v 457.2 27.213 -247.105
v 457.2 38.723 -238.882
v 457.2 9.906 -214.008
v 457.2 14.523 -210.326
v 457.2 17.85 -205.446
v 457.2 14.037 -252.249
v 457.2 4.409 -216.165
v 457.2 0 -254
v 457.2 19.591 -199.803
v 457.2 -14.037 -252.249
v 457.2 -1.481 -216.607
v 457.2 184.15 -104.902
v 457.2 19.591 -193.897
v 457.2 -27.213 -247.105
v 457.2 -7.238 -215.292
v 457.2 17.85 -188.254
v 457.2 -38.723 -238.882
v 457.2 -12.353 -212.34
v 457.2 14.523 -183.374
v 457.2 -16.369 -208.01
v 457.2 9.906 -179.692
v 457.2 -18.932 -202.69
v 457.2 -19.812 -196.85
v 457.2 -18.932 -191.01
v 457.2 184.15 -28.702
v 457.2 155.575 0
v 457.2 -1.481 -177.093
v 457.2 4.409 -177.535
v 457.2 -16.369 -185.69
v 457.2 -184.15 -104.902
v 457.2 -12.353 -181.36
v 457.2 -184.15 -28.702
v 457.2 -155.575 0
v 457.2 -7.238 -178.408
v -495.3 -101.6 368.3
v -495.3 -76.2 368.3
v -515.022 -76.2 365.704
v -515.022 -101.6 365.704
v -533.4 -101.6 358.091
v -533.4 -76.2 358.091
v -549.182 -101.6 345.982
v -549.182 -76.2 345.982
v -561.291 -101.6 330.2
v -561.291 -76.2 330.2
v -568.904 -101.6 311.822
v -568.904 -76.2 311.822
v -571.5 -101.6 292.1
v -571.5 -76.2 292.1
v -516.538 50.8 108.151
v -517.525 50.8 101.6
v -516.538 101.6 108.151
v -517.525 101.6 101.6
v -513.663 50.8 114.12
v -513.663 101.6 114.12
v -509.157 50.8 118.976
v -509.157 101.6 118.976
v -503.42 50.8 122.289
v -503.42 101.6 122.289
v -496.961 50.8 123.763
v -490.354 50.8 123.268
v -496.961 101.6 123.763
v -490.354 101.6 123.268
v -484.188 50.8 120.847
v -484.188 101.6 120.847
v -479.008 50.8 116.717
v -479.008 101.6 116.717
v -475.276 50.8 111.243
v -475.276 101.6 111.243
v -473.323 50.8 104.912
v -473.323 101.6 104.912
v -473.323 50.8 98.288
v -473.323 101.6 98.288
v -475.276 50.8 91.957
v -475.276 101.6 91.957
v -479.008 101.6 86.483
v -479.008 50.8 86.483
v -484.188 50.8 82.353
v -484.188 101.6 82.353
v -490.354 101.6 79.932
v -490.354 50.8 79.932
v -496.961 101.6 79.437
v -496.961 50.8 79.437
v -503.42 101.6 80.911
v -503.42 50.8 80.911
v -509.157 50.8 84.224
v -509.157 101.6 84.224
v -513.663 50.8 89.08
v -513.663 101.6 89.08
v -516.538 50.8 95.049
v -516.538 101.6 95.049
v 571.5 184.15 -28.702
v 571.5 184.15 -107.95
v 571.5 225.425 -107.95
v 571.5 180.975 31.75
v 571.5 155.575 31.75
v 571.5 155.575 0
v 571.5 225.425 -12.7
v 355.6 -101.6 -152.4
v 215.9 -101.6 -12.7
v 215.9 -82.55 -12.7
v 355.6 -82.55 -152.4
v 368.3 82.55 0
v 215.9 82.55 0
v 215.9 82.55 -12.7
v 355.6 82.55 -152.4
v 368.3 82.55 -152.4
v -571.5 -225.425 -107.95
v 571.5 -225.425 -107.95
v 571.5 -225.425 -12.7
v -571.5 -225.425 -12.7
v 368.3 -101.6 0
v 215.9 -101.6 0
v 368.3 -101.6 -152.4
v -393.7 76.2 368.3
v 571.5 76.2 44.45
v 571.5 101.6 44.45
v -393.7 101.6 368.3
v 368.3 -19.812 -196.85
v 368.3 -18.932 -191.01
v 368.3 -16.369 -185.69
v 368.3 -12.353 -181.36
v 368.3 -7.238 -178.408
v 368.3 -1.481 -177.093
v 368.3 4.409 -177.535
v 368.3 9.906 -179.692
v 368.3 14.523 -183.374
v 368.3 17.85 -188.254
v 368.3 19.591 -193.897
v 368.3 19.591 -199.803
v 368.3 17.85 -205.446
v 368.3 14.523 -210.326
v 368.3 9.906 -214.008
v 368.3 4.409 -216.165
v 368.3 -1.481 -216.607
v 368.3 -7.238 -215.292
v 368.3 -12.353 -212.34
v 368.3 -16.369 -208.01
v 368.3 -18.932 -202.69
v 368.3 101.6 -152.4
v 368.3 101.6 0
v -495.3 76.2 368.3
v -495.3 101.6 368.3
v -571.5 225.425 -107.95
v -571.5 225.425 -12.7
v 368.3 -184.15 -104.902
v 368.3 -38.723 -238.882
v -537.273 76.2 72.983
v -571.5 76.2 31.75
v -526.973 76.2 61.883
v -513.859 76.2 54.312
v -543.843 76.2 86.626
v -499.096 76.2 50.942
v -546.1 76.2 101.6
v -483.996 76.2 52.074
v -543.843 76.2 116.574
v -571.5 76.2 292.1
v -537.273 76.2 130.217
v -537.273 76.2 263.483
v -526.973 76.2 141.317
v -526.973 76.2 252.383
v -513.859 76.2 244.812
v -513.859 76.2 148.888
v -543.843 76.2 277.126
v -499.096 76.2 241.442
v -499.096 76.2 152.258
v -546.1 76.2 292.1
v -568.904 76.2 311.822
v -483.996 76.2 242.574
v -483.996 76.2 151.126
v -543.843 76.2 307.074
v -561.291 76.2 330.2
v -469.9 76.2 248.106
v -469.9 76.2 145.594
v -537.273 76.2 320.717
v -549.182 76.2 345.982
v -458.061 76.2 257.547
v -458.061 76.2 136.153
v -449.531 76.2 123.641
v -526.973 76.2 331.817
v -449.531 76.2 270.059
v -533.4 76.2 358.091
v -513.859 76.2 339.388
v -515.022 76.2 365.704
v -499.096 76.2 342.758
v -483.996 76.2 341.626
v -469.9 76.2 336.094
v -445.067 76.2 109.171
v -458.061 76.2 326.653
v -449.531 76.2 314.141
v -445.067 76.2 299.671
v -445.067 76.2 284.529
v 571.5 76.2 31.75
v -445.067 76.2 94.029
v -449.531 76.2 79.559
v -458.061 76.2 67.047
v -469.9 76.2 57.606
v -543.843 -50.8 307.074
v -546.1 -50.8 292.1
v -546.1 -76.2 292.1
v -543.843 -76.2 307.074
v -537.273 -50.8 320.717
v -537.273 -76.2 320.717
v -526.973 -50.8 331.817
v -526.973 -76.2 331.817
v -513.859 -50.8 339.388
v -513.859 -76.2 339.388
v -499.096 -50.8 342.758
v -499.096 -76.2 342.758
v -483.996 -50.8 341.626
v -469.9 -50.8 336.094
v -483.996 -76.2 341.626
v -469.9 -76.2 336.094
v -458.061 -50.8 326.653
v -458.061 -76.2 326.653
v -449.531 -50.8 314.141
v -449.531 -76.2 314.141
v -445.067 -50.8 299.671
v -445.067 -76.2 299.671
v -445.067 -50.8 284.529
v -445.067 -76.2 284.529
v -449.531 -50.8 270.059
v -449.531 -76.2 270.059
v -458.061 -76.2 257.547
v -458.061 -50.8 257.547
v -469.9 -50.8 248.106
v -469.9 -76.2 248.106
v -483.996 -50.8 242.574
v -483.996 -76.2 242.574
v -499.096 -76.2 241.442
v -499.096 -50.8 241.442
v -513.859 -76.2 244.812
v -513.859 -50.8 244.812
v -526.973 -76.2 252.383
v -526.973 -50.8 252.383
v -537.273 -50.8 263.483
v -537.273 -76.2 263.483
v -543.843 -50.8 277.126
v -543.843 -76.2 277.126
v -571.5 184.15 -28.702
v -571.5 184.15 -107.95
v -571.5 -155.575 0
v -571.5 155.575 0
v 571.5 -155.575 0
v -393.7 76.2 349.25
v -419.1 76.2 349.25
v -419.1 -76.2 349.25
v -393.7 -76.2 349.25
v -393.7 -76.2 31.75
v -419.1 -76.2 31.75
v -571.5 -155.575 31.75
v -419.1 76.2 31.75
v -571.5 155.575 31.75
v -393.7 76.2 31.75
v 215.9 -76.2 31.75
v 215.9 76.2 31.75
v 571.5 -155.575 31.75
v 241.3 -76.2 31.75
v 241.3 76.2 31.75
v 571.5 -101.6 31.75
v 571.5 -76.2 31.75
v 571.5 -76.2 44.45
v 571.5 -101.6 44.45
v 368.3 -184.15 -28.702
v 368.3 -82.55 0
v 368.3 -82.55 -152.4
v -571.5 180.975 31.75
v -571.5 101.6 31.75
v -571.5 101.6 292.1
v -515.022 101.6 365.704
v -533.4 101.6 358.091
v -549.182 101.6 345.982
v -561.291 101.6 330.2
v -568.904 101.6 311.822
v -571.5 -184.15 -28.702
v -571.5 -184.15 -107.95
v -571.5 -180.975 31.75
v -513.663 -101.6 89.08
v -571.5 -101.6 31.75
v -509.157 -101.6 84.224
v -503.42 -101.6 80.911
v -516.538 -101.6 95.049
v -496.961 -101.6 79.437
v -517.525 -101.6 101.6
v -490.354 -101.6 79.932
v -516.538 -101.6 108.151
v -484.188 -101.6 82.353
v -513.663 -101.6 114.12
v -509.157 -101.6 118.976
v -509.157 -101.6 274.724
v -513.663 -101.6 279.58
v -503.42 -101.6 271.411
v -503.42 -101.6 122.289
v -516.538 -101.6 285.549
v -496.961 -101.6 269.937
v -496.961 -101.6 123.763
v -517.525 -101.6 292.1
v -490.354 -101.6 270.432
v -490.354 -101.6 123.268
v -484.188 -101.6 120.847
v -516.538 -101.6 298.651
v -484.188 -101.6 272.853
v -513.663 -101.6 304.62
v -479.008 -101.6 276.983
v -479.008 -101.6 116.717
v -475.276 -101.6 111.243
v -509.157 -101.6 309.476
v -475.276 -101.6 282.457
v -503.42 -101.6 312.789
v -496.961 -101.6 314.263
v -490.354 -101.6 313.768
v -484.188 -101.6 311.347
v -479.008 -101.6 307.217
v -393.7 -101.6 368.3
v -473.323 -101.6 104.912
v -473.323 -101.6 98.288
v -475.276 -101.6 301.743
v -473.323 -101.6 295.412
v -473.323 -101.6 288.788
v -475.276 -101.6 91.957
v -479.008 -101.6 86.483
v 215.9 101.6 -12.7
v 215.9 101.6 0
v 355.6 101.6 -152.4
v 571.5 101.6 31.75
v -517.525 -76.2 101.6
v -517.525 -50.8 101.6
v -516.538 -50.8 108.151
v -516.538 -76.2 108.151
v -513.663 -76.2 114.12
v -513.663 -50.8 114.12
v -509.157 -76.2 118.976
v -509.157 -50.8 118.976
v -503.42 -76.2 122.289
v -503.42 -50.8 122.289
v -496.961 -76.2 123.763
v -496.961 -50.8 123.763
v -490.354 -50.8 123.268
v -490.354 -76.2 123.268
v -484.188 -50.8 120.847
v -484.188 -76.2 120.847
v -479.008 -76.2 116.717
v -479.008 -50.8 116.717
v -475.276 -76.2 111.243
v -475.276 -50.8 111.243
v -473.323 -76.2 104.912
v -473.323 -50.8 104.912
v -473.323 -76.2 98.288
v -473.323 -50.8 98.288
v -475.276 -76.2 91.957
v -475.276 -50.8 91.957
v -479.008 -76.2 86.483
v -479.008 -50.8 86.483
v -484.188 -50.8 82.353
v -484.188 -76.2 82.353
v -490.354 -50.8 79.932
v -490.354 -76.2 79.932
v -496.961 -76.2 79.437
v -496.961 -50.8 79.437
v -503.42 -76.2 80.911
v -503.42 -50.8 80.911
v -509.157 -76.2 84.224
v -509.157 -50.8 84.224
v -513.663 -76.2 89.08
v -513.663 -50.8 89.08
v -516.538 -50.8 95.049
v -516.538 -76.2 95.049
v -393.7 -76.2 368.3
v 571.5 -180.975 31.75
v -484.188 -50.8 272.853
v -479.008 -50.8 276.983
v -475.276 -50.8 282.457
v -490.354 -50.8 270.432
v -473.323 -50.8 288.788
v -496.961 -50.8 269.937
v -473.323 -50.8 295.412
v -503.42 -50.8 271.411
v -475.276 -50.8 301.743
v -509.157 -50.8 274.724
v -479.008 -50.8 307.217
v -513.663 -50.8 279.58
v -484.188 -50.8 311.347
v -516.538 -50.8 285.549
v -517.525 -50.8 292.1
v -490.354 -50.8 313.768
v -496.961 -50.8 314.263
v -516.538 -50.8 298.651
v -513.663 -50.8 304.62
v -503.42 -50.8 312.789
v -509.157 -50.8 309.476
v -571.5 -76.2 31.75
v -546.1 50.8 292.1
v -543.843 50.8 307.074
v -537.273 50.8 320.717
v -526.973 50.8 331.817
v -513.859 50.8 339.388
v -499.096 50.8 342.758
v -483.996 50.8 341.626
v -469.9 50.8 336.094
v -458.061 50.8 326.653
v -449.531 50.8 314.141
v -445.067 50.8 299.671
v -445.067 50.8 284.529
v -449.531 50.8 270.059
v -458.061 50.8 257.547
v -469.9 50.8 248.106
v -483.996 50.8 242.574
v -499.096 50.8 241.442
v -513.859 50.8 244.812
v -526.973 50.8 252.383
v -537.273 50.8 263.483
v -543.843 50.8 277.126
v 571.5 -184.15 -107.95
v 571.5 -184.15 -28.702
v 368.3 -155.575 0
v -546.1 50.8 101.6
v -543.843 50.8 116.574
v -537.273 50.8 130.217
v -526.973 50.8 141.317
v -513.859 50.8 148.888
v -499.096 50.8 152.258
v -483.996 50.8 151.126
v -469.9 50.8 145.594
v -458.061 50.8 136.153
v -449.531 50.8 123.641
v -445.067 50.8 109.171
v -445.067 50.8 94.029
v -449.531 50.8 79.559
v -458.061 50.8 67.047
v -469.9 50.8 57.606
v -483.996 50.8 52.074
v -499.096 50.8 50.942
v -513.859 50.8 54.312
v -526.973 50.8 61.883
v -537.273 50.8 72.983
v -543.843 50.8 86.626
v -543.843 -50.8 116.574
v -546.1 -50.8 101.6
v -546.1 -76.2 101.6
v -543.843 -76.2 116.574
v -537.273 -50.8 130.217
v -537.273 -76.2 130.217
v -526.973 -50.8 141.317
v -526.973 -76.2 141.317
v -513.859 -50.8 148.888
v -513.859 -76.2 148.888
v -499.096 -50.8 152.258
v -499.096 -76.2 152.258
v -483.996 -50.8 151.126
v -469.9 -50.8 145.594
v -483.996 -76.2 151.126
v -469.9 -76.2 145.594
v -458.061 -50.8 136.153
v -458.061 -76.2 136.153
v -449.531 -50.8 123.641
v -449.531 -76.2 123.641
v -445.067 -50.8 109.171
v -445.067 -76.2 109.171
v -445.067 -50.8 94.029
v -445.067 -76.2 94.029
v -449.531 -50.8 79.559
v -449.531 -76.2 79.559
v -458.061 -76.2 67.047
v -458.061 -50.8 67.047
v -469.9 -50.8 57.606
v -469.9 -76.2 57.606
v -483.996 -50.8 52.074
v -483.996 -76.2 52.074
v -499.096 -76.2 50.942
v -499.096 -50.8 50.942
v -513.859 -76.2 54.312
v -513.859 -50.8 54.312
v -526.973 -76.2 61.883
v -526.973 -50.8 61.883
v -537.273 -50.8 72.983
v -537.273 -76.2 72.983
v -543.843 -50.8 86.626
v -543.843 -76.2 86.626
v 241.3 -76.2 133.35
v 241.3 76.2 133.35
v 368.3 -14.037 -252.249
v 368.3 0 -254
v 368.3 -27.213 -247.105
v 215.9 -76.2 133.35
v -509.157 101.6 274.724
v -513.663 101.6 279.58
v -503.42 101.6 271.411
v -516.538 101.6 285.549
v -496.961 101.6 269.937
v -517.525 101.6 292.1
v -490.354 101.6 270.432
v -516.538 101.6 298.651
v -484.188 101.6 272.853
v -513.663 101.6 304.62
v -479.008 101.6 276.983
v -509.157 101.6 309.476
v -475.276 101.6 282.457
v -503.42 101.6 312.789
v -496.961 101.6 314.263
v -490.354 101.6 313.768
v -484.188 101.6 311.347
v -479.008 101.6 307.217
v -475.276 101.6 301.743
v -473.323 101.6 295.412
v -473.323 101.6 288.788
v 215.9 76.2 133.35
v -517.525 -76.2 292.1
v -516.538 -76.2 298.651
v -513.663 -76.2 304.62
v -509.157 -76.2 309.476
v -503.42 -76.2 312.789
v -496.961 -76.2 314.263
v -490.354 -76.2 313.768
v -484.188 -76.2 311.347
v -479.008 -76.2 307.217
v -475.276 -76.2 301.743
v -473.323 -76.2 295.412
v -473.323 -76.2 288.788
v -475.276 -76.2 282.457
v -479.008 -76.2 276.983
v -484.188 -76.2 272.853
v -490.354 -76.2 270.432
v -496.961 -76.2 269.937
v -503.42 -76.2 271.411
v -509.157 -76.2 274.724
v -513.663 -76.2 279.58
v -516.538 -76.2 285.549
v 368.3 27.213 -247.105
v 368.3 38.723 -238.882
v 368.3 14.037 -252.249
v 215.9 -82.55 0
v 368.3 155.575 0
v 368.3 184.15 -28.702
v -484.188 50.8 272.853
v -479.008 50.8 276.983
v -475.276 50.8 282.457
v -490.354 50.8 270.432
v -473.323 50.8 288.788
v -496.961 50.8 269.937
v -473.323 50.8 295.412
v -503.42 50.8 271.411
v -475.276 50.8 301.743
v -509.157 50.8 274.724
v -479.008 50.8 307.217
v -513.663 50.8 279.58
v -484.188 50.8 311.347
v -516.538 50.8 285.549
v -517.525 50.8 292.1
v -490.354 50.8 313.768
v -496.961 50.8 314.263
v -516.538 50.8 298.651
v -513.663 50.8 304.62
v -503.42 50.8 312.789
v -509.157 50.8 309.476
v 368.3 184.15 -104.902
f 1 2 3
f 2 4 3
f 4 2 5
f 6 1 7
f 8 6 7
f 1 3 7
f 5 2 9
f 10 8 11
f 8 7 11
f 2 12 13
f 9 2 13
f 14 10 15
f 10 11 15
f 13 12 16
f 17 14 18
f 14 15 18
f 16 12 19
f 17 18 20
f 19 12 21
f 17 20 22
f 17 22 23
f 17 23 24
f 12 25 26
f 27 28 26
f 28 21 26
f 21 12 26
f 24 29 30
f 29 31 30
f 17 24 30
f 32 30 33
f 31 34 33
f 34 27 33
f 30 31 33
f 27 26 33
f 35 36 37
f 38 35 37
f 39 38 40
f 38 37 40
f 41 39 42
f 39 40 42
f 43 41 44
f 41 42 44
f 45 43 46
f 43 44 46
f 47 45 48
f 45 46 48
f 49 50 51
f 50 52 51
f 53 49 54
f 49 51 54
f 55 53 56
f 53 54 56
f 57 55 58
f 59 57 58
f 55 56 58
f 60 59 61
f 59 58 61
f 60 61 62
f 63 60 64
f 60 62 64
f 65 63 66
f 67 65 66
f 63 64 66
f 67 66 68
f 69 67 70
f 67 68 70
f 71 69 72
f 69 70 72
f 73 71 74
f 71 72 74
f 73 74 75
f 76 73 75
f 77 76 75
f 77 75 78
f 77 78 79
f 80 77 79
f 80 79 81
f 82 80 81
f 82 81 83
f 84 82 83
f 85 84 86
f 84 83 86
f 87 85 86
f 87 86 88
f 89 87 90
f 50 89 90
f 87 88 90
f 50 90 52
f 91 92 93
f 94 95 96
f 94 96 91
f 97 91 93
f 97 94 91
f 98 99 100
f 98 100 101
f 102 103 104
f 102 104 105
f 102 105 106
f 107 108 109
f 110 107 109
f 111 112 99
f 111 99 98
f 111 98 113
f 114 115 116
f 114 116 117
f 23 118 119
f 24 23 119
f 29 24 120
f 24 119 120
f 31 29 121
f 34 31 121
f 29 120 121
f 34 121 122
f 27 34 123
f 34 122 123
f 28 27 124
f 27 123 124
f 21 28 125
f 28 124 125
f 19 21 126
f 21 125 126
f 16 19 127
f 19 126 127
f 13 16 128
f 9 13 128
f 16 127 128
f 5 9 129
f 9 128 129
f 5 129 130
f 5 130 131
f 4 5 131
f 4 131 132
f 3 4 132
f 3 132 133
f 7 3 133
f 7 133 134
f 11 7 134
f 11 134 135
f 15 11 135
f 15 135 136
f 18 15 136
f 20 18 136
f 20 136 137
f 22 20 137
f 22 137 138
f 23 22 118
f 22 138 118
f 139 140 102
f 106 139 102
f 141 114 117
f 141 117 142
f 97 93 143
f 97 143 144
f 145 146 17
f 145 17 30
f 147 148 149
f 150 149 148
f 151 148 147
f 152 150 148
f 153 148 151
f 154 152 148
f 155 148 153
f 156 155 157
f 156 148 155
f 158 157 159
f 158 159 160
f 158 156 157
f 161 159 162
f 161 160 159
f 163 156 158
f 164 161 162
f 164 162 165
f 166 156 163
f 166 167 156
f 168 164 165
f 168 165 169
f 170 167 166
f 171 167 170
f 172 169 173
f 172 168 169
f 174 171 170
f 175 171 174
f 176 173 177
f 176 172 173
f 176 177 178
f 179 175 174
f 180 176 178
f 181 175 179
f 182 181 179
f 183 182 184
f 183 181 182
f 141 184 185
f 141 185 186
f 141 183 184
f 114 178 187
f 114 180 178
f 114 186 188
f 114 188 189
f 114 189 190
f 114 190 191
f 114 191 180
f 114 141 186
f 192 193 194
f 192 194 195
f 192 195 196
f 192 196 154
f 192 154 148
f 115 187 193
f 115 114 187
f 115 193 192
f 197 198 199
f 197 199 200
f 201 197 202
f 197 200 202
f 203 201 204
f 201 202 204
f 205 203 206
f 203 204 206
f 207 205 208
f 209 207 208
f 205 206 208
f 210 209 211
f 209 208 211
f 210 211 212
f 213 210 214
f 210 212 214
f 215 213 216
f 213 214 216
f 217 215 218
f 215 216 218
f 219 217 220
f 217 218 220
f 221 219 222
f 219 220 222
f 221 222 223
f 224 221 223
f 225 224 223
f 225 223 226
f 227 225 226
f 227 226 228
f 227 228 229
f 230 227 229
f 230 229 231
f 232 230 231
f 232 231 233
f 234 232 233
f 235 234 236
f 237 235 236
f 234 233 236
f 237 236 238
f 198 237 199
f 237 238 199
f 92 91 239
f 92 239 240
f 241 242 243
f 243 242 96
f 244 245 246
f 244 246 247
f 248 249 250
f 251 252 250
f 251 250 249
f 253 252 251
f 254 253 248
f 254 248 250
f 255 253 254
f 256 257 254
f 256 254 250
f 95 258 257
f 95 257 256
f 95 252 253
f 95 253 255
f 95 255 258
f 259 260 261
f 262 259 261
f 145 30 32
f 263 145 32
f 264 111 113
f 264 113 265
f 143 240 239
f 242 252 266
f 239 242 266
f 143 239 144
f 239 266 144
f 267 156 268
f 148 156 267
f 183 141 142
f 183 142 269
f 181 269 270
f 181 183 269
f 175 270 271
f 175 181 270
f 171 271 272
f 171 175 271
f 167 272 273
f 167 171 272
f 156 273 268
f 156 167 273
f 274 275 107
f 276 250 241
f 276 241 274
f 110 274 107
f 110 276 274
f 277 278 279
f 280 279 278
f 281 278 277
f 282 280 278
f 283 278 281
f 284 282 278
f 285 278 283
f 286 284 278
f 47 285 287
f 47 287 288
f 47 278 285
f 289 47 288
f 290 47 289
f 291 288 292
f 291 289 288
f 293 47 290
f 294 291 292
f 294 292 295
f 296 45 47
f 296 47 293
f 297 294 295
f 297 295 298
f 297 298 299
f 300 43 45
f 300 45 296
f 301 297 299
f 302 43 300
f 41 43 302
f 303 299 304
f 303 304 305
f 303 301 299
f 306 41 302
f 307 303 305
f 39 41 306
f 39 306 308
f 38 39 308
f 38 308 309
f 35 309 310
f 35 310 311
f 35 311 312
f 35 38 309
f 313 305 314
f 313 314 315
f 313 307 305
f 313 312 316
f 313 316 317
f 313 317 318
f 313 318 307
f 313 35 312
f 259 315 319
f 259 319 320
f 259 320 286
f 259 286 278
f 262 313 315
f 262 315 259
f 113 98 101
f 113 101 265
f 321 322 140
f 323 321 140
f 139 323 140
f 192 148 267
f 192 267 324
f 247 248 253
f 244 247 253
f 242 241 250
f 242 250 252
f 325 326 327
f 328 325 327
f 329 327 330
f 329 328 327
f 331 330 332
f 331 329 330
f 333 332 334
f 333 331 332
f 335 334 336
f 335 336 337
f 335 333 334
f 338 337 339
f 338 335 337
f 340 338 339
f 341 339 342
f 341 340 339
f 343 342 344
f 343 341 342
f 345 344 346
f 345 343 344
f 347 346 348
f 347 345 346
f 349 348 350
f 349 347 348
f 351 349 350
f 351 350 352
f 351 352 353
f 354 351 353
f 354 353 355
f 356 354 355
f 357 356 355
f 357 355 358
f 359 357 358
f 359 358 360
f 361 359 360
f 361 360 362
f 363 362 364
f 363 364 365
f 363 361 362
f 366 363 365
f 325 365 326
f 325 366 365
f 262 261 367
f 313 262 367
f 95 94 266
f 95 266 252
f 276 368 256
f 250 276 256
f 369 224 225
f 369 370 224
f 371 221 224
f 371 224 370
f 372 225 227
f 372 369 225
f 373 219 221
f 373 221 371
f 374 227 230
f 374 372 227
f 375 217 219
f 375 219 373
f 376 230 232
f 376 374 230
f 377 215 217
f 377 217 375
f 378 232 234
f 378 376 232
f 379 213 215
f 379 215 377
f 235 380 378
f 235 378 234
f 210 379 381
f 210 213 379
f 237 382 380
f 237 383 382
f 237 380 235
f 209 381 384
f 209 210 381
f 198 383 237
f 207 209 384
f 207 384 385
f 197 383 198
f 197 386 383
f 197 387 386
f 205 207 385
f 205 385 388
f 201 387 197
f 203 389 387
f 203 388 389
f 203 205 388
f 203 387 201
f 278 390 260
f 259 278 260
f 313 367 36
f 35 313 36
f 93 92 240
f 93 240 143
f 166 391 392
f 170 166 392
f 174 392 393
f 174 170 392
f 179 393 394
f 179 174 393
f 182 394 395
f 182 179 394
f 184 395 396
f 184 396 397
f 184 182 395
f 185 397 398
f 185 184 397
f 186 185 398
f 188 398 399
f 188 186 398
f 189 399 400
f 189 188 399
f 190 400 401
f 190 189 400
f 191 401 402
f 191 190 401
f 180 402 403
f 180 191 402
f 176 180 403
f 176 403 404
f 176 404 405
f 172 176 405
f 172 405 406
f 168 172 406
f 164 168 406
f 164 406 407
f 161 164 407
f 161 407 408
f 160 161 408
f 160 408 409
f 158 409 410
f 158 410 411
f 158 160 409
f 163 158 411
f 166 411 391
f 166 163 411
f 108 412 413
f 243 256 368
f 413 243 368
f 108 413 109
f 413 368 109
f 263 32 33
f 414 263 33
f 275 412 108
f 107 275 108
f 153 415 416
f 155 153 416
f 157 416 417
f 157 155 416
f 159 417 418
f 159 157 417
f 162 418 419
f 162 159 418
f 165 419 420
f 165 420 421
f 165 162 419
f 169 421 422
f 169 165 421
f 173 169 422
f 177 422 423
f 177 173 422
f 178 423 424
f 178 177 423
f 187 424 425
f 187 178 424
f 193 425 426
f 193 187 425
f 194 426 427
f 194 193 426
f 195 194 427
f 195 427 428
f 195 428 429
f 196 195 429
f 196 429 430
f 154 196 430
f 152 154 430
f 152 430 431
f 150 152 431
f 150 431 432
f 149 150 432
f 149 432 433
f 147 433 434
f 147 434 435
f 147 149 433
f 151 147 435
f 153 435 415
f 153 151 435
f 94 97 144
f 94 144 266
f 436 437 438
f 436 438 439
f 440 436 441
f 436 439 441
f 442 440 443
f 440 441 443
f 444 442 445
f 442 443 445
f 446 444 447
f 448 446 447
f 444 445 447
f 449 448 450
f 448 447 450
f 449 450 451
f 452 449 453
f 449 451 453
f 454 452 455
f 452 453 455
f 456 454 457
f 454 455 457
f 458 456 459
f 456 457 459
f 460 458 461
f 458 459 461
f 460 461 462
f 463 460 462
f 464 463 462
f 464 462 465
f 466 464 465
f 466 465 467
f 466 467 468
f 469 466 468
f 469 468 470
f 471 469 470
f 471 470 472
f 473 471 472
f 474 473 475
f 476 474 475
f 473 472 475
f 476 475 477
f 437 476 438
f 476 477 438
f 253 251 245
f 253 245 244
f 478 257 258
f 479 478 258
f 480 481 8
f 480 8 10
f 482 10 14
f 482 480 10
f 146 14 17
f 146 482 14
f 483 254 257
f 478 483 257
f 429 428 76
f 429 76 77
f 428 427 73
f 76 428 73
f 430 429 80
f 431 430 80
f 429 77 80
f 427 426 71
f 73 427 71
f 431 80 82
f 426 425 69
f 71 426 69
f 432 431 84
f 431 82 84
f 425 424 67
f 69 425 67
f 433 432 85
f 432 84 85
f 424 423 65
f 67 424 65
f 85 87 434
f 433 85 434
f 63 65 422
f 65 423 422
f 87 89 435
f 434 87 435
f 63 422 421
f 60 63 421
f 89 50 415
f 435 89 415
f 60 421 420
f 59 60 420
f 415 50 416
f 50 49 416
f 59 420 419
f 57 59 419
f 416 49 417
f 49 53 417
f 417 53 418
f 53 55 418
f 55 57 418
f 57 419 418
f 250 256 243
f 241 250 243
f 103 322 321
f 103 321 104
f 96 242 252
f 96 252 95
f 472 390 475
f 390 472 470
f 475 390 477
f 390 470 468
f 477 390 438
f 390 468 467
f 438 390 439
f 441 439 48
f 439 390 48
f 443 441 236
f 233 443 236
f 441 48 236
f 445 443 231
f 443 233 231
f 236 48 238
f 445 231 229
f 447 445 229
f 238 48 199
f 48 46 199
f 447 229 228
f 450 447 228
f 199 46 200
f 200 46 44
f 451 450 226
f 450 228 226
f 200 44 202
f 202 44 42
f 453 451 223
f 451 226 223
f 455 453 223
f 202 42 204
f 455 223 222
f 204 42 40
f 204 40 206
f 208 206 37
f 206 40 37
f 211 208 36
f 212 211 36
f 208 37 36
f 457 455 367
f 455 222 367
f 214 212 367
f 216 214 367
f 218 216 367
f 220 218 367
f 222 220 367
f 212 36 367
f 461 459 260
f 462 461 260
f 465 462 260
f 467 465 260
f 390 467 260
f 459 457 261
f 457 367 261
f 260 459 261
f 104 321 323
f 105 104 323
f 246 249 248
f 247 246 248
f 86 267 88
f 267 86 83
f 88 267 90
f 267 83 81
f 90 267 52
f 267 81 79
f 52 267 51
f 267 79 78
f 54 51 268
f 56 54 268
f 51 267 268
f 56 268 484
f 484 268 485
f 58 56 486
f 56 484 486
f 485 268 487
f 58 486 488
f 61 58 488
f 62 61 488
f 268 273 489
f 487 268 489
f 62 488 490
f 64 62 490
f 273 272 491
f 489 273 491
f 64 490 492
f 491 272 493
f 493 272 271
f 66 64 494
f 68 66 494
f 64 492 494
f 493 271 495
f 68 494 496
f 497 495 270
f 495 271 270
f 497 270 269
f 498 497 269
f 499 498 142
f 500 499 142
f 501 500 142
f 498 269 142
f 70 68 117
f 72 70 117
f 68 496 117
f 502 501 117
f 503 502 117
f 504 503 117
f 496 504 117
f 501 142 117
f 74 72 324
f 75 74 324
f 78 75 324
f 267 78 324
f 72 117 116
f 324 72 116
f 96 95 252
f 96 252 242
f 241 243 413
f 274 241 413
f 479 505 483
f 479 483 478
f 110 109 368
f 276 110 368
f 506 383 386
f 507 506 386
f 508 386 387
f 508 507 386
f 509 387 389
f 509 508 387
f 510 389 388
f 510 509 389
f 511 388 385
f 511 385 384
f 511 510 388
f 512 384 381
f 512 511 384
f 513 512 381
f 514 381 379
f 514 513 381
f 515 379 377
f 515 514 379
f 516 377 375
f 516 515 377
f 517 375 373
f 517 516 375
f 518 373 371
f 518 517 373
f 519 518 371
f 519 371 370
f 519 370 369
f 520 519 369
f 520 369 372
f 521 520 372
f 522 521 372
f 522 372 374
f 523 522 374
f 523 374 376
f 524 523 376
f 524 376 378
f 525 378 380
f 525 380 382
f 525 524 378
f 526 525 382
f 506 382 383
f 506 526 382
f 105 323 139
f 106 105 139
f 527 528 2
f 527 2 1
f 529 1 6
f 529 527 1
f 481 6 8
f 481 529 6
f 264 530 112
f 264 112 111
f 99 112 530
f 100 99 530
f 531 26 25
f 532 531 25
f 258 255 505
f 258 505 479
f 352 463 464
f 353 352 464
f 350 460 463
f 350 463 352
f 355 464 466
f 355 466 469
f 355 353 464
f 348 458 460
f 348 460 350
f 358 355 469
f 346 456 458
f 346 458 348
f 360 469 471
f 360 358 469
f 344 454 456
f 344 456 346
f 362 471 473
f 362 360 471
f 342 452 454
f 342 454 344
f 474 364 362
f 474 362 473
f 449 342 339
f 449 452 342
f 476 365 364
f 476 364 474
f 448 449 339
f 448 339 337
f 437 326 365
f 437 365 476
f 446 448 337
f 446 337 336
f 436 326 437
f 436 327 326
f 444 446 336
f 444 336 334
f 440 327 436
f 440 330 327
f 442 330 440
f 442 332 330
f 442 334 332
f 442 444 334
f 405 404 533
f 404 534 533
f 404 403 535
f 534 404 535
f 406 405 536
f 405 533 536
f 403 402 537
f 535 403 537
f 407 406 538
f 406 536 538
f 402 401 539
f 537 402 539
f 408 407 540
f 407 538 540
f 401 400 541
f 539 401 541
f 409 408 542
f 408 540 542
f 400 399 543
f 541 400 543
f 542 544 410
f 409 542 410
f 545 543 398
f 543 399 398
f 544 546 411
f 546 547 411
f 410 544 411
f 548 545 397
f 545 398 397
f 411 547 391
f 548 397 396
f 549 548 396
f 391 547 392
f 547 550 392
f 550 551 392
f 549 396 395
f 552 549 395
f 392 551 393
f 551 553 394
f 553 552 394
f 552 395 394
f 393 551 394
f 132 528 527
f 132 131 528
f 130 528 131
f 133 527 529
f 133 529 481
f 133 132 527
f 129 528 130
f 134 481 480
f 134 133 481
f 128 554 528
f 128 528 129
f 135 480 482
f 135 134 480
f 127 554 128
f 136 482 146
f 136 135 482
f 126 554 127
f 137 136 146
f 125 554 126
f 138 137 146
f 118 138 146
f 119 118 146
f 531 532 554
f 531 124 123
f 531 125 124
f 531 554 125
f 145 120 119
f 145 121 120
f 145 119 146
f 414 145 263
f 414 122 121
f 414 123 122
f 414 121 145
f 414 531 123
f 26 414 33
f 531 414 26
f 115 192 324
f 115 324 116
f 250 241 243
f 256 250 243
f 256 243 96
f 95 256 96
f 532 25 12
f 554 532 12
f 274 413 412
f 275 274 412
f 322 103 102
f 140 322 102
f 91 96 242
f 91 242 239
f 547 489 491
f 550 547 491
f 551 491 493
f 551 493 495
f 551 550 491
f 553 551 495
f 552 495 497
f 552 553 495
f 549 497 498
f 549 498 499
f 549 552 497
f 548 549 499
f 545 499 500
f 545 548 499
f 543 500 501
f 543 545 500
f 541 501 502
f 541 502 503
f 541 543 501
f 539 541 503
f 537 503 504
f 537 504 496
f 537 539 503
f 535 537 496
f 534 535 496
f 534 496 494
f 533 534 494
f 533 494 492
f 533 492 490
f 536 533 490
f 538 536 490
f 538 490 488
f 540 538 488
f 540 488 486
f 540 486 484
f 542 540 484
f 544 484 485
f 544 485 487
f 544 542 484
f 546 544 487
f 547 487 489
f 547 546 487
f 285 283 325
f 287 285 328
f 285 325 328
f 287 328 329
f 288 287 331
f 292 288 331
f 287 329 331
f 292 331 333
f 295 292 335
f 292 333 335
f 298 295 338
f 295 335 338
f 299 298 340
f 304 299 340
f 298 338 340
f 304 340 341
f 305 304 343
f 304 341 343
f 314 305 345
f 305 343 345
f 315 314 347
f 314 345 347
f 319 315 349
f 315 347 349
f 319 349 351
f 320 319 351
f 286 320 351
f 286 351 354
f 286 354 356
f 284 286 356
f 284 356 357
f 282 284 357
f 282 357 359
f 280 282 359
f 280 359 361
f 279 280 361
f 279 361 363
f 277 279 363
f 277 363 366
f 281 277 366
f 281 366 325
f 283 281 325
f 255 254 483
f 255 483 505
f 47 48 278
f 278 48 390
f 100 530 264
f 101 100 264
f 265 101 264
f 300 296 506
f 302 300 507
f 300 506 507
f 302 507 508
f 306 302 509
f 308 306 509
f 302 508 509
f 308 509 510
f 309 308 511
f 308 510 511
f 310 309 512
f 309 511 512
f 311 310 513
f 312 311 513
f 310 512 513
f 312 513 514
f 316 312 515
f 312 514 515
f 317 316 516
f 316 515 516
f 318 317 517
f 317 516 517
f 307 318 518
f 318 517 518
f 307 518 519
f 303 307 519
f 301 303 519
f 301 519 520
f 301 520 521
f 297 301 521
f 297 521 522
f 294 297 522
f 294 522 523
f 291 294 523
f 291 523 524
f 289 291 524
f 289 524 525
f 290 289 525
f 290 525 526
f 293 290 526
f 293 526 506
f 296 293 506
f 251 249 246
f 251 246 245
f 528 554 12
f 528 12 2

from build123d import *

# Parameters (mm, degrees)
F0_W      = 1143
F0_H      = 311.15
F1_DEPTH  = 31.75
F2_W      = 25.4
F2_H      = 152.4
F3_DEPTH  = 317.5
F4_W      = 25.4
F4_H      = 152.4
F5_DEPTH  = 101.6
F7_DEPTH  = 25.4
F9_D      = 44.45
F10_R     = 50.8
F10_R_2   = 22.225
F11_DEPTH = 25.4
F14_R     = 19.812
F15_DEPTH = 88.9
F16_W     = 152.4
F16_H     = 19.05
F17_DEPTH = 152.4
F19_DEPTH = 285.751
F22_DEPTH = 1143


with BuildPart() as f1:
    # F0 (on Top) → F1 (new body)
    with BuildSketch(Plane.XY):
        Rectangle(F0_W, F0_H)
    extrude(amount=F1_DEPTH)

    # F2 (on face) → F3 (join)
    with BuildSketch(Plane.XY.offset(31.75)):
        with Locations((-406.4, 0)):
            Rectangle(F2_W, F2_H)
    extrude(amount=F3_DEPTH)

    # F4 (on face) → F5 (join)
    with BuildSketch(Plane.XY.offset(31.75)):
        with Locations((228.6, 0)):
            Rectangle(F4_W, F4_H)
    extrude(amount=F5_DEPTH)


with BuildPart() as f7:
    # F6 (on face) → F7 (new body)
    with BuildSketch(Plane.XZ.offset(76.2)):
        with BuildLine():
            Line((-571.5, 292.1), (-571.5, 31.75))
            Line((-571.5, 31.75), (571.5, 31.75))
            Line((571.5, 31.75), (571.5, 44.45))
            Line((571.5, 44.45), (-393.7, 368.3))
            Line((-393.7, 368.3), (-495.3, 368.3))
            ThreePointArc((-495.3, 368.3), (-549.1815367264, 345.9815367264), (-571.5, 292.1))
        make_face()
    extrude(amount=F7_DEPTH)

    # F9 (through all)
    with Locations(Plane.XZ.offset(101.6)):
        with Locations((-495.3, 292.1), (-495.3, 101.6)):
            Hole(F9_D / 2)

    # F10 (on face) → F11 (join)
    with BuildSketch(Plane(origin=(0, -76.2, 0), x_dir=(-1, 0, 0), z_dir=(0, 1, 0))):
        with Locations((495.3, 101.6)):
            Circle(F10_R)
        with Locations((495.3, 101.6)):
            Circle(F10_R_2, mode=Mode.SUBTRACT)
        with Locations((495.3, 292.1)):
            Circle(F10_R)
        with Locations((495.3, 292.1)):
            Circle(F10_R_2, mode=Mode.SUBTRACT)
    extrude(amount=F11_DEPTH)


with BuildPart() as f12_1:
    # F12: instance of F7
    add(f7.part.mirror(Plane.XZ))


with BuildPart() as f15:
    # F14 (on offset) → F15 (new body)
    with BuildSketch(Plane(origin=(368.3, 0, 0), x_dir=(0, -1, 0), z_dir=(-1, 0, 0))):
        with BuildLine():
            Line((155.575, 0), (-155.575, 0))
            Line((-155.575, 0), (-184.15, -28.702))
            Line((-184.15, -28.702), (-184.15, -104.902))
            Line((-184.15, -104.902), (-38.7229986572, -238.8815580843))
            ThreePointArc((-38.7229986572, -238.8815580843), (-20.7848376589, -250.0863881522), (6.38e-08, -254))
            ThreePointArc((6.38e-08, -254), (20.7848377183, -250.086388129), (38.7229986572, -238.8815580843))
            Line((38.7229986572, -238.8815580843), (184.15, -104.902))
            Line((184.15, -104.902), (184.15, -28.702))
            Line((184.15, -28.702), (155.575, 0))
        make_face()
        with Locations((0, -196.85)):
            Circle(F14_R, mode=Mode.SUBTRACT)
    extrude(amount=-F15_DEPTH)


with BuildPart() as f17:
    # F16 (on face) → F17 (new body)
    with BuildSketch(Plane(origin=(0, 0, 0), x_dir=(1, 0, 0), z_dir=(0, 0, -1))):
        with Locations((292.1, -92.075)):
            Rectangle(F16_W, F16_H)
    extrude(amount=F17_DEPTH)

    # F18 (on face) → F19 (cut, through all)
    with BuildSketch(Plane(origin=(0, 101.6, 0), x_dir=(-1, 0, 0), z_dir=(0, 1, 0))):
        Polygon((-215.9, -12.7), (-355.6, -152.4), (-215.9, -152.4), align=None)
    extrude(amount=-F19_DEPTH, mode=Mode.SUBTRACT)


with BuildPart() as f20_1:
    # F20: instance of F17
    add(f17.part.mirror(Plane.XZ))


with BuildPart() as f22:
    # F21 (on face) → F22 (new body)
    with BuildSketch(Plane.YZ.offset(571.5)):
        Polygon((180.975, 31.75), (155.575, 31.75), (155.575, 0), (184.15, -28.702), (184.15, -107.95), (191.3808882236, -107.95), (225.425, -107.95), (225.425, -12.7), align=None)
    extrude(amount=-F22_DEPTH)


with BuildPart() as f23_1:
    # F23: instance of F22
    add(f22.part.mirror(Plane.XZ))


solid = Compound([f1.part, f7.part, f12_1.part, f15.part, f17.part, f20_1.part, f22.part, f23_1.part])
